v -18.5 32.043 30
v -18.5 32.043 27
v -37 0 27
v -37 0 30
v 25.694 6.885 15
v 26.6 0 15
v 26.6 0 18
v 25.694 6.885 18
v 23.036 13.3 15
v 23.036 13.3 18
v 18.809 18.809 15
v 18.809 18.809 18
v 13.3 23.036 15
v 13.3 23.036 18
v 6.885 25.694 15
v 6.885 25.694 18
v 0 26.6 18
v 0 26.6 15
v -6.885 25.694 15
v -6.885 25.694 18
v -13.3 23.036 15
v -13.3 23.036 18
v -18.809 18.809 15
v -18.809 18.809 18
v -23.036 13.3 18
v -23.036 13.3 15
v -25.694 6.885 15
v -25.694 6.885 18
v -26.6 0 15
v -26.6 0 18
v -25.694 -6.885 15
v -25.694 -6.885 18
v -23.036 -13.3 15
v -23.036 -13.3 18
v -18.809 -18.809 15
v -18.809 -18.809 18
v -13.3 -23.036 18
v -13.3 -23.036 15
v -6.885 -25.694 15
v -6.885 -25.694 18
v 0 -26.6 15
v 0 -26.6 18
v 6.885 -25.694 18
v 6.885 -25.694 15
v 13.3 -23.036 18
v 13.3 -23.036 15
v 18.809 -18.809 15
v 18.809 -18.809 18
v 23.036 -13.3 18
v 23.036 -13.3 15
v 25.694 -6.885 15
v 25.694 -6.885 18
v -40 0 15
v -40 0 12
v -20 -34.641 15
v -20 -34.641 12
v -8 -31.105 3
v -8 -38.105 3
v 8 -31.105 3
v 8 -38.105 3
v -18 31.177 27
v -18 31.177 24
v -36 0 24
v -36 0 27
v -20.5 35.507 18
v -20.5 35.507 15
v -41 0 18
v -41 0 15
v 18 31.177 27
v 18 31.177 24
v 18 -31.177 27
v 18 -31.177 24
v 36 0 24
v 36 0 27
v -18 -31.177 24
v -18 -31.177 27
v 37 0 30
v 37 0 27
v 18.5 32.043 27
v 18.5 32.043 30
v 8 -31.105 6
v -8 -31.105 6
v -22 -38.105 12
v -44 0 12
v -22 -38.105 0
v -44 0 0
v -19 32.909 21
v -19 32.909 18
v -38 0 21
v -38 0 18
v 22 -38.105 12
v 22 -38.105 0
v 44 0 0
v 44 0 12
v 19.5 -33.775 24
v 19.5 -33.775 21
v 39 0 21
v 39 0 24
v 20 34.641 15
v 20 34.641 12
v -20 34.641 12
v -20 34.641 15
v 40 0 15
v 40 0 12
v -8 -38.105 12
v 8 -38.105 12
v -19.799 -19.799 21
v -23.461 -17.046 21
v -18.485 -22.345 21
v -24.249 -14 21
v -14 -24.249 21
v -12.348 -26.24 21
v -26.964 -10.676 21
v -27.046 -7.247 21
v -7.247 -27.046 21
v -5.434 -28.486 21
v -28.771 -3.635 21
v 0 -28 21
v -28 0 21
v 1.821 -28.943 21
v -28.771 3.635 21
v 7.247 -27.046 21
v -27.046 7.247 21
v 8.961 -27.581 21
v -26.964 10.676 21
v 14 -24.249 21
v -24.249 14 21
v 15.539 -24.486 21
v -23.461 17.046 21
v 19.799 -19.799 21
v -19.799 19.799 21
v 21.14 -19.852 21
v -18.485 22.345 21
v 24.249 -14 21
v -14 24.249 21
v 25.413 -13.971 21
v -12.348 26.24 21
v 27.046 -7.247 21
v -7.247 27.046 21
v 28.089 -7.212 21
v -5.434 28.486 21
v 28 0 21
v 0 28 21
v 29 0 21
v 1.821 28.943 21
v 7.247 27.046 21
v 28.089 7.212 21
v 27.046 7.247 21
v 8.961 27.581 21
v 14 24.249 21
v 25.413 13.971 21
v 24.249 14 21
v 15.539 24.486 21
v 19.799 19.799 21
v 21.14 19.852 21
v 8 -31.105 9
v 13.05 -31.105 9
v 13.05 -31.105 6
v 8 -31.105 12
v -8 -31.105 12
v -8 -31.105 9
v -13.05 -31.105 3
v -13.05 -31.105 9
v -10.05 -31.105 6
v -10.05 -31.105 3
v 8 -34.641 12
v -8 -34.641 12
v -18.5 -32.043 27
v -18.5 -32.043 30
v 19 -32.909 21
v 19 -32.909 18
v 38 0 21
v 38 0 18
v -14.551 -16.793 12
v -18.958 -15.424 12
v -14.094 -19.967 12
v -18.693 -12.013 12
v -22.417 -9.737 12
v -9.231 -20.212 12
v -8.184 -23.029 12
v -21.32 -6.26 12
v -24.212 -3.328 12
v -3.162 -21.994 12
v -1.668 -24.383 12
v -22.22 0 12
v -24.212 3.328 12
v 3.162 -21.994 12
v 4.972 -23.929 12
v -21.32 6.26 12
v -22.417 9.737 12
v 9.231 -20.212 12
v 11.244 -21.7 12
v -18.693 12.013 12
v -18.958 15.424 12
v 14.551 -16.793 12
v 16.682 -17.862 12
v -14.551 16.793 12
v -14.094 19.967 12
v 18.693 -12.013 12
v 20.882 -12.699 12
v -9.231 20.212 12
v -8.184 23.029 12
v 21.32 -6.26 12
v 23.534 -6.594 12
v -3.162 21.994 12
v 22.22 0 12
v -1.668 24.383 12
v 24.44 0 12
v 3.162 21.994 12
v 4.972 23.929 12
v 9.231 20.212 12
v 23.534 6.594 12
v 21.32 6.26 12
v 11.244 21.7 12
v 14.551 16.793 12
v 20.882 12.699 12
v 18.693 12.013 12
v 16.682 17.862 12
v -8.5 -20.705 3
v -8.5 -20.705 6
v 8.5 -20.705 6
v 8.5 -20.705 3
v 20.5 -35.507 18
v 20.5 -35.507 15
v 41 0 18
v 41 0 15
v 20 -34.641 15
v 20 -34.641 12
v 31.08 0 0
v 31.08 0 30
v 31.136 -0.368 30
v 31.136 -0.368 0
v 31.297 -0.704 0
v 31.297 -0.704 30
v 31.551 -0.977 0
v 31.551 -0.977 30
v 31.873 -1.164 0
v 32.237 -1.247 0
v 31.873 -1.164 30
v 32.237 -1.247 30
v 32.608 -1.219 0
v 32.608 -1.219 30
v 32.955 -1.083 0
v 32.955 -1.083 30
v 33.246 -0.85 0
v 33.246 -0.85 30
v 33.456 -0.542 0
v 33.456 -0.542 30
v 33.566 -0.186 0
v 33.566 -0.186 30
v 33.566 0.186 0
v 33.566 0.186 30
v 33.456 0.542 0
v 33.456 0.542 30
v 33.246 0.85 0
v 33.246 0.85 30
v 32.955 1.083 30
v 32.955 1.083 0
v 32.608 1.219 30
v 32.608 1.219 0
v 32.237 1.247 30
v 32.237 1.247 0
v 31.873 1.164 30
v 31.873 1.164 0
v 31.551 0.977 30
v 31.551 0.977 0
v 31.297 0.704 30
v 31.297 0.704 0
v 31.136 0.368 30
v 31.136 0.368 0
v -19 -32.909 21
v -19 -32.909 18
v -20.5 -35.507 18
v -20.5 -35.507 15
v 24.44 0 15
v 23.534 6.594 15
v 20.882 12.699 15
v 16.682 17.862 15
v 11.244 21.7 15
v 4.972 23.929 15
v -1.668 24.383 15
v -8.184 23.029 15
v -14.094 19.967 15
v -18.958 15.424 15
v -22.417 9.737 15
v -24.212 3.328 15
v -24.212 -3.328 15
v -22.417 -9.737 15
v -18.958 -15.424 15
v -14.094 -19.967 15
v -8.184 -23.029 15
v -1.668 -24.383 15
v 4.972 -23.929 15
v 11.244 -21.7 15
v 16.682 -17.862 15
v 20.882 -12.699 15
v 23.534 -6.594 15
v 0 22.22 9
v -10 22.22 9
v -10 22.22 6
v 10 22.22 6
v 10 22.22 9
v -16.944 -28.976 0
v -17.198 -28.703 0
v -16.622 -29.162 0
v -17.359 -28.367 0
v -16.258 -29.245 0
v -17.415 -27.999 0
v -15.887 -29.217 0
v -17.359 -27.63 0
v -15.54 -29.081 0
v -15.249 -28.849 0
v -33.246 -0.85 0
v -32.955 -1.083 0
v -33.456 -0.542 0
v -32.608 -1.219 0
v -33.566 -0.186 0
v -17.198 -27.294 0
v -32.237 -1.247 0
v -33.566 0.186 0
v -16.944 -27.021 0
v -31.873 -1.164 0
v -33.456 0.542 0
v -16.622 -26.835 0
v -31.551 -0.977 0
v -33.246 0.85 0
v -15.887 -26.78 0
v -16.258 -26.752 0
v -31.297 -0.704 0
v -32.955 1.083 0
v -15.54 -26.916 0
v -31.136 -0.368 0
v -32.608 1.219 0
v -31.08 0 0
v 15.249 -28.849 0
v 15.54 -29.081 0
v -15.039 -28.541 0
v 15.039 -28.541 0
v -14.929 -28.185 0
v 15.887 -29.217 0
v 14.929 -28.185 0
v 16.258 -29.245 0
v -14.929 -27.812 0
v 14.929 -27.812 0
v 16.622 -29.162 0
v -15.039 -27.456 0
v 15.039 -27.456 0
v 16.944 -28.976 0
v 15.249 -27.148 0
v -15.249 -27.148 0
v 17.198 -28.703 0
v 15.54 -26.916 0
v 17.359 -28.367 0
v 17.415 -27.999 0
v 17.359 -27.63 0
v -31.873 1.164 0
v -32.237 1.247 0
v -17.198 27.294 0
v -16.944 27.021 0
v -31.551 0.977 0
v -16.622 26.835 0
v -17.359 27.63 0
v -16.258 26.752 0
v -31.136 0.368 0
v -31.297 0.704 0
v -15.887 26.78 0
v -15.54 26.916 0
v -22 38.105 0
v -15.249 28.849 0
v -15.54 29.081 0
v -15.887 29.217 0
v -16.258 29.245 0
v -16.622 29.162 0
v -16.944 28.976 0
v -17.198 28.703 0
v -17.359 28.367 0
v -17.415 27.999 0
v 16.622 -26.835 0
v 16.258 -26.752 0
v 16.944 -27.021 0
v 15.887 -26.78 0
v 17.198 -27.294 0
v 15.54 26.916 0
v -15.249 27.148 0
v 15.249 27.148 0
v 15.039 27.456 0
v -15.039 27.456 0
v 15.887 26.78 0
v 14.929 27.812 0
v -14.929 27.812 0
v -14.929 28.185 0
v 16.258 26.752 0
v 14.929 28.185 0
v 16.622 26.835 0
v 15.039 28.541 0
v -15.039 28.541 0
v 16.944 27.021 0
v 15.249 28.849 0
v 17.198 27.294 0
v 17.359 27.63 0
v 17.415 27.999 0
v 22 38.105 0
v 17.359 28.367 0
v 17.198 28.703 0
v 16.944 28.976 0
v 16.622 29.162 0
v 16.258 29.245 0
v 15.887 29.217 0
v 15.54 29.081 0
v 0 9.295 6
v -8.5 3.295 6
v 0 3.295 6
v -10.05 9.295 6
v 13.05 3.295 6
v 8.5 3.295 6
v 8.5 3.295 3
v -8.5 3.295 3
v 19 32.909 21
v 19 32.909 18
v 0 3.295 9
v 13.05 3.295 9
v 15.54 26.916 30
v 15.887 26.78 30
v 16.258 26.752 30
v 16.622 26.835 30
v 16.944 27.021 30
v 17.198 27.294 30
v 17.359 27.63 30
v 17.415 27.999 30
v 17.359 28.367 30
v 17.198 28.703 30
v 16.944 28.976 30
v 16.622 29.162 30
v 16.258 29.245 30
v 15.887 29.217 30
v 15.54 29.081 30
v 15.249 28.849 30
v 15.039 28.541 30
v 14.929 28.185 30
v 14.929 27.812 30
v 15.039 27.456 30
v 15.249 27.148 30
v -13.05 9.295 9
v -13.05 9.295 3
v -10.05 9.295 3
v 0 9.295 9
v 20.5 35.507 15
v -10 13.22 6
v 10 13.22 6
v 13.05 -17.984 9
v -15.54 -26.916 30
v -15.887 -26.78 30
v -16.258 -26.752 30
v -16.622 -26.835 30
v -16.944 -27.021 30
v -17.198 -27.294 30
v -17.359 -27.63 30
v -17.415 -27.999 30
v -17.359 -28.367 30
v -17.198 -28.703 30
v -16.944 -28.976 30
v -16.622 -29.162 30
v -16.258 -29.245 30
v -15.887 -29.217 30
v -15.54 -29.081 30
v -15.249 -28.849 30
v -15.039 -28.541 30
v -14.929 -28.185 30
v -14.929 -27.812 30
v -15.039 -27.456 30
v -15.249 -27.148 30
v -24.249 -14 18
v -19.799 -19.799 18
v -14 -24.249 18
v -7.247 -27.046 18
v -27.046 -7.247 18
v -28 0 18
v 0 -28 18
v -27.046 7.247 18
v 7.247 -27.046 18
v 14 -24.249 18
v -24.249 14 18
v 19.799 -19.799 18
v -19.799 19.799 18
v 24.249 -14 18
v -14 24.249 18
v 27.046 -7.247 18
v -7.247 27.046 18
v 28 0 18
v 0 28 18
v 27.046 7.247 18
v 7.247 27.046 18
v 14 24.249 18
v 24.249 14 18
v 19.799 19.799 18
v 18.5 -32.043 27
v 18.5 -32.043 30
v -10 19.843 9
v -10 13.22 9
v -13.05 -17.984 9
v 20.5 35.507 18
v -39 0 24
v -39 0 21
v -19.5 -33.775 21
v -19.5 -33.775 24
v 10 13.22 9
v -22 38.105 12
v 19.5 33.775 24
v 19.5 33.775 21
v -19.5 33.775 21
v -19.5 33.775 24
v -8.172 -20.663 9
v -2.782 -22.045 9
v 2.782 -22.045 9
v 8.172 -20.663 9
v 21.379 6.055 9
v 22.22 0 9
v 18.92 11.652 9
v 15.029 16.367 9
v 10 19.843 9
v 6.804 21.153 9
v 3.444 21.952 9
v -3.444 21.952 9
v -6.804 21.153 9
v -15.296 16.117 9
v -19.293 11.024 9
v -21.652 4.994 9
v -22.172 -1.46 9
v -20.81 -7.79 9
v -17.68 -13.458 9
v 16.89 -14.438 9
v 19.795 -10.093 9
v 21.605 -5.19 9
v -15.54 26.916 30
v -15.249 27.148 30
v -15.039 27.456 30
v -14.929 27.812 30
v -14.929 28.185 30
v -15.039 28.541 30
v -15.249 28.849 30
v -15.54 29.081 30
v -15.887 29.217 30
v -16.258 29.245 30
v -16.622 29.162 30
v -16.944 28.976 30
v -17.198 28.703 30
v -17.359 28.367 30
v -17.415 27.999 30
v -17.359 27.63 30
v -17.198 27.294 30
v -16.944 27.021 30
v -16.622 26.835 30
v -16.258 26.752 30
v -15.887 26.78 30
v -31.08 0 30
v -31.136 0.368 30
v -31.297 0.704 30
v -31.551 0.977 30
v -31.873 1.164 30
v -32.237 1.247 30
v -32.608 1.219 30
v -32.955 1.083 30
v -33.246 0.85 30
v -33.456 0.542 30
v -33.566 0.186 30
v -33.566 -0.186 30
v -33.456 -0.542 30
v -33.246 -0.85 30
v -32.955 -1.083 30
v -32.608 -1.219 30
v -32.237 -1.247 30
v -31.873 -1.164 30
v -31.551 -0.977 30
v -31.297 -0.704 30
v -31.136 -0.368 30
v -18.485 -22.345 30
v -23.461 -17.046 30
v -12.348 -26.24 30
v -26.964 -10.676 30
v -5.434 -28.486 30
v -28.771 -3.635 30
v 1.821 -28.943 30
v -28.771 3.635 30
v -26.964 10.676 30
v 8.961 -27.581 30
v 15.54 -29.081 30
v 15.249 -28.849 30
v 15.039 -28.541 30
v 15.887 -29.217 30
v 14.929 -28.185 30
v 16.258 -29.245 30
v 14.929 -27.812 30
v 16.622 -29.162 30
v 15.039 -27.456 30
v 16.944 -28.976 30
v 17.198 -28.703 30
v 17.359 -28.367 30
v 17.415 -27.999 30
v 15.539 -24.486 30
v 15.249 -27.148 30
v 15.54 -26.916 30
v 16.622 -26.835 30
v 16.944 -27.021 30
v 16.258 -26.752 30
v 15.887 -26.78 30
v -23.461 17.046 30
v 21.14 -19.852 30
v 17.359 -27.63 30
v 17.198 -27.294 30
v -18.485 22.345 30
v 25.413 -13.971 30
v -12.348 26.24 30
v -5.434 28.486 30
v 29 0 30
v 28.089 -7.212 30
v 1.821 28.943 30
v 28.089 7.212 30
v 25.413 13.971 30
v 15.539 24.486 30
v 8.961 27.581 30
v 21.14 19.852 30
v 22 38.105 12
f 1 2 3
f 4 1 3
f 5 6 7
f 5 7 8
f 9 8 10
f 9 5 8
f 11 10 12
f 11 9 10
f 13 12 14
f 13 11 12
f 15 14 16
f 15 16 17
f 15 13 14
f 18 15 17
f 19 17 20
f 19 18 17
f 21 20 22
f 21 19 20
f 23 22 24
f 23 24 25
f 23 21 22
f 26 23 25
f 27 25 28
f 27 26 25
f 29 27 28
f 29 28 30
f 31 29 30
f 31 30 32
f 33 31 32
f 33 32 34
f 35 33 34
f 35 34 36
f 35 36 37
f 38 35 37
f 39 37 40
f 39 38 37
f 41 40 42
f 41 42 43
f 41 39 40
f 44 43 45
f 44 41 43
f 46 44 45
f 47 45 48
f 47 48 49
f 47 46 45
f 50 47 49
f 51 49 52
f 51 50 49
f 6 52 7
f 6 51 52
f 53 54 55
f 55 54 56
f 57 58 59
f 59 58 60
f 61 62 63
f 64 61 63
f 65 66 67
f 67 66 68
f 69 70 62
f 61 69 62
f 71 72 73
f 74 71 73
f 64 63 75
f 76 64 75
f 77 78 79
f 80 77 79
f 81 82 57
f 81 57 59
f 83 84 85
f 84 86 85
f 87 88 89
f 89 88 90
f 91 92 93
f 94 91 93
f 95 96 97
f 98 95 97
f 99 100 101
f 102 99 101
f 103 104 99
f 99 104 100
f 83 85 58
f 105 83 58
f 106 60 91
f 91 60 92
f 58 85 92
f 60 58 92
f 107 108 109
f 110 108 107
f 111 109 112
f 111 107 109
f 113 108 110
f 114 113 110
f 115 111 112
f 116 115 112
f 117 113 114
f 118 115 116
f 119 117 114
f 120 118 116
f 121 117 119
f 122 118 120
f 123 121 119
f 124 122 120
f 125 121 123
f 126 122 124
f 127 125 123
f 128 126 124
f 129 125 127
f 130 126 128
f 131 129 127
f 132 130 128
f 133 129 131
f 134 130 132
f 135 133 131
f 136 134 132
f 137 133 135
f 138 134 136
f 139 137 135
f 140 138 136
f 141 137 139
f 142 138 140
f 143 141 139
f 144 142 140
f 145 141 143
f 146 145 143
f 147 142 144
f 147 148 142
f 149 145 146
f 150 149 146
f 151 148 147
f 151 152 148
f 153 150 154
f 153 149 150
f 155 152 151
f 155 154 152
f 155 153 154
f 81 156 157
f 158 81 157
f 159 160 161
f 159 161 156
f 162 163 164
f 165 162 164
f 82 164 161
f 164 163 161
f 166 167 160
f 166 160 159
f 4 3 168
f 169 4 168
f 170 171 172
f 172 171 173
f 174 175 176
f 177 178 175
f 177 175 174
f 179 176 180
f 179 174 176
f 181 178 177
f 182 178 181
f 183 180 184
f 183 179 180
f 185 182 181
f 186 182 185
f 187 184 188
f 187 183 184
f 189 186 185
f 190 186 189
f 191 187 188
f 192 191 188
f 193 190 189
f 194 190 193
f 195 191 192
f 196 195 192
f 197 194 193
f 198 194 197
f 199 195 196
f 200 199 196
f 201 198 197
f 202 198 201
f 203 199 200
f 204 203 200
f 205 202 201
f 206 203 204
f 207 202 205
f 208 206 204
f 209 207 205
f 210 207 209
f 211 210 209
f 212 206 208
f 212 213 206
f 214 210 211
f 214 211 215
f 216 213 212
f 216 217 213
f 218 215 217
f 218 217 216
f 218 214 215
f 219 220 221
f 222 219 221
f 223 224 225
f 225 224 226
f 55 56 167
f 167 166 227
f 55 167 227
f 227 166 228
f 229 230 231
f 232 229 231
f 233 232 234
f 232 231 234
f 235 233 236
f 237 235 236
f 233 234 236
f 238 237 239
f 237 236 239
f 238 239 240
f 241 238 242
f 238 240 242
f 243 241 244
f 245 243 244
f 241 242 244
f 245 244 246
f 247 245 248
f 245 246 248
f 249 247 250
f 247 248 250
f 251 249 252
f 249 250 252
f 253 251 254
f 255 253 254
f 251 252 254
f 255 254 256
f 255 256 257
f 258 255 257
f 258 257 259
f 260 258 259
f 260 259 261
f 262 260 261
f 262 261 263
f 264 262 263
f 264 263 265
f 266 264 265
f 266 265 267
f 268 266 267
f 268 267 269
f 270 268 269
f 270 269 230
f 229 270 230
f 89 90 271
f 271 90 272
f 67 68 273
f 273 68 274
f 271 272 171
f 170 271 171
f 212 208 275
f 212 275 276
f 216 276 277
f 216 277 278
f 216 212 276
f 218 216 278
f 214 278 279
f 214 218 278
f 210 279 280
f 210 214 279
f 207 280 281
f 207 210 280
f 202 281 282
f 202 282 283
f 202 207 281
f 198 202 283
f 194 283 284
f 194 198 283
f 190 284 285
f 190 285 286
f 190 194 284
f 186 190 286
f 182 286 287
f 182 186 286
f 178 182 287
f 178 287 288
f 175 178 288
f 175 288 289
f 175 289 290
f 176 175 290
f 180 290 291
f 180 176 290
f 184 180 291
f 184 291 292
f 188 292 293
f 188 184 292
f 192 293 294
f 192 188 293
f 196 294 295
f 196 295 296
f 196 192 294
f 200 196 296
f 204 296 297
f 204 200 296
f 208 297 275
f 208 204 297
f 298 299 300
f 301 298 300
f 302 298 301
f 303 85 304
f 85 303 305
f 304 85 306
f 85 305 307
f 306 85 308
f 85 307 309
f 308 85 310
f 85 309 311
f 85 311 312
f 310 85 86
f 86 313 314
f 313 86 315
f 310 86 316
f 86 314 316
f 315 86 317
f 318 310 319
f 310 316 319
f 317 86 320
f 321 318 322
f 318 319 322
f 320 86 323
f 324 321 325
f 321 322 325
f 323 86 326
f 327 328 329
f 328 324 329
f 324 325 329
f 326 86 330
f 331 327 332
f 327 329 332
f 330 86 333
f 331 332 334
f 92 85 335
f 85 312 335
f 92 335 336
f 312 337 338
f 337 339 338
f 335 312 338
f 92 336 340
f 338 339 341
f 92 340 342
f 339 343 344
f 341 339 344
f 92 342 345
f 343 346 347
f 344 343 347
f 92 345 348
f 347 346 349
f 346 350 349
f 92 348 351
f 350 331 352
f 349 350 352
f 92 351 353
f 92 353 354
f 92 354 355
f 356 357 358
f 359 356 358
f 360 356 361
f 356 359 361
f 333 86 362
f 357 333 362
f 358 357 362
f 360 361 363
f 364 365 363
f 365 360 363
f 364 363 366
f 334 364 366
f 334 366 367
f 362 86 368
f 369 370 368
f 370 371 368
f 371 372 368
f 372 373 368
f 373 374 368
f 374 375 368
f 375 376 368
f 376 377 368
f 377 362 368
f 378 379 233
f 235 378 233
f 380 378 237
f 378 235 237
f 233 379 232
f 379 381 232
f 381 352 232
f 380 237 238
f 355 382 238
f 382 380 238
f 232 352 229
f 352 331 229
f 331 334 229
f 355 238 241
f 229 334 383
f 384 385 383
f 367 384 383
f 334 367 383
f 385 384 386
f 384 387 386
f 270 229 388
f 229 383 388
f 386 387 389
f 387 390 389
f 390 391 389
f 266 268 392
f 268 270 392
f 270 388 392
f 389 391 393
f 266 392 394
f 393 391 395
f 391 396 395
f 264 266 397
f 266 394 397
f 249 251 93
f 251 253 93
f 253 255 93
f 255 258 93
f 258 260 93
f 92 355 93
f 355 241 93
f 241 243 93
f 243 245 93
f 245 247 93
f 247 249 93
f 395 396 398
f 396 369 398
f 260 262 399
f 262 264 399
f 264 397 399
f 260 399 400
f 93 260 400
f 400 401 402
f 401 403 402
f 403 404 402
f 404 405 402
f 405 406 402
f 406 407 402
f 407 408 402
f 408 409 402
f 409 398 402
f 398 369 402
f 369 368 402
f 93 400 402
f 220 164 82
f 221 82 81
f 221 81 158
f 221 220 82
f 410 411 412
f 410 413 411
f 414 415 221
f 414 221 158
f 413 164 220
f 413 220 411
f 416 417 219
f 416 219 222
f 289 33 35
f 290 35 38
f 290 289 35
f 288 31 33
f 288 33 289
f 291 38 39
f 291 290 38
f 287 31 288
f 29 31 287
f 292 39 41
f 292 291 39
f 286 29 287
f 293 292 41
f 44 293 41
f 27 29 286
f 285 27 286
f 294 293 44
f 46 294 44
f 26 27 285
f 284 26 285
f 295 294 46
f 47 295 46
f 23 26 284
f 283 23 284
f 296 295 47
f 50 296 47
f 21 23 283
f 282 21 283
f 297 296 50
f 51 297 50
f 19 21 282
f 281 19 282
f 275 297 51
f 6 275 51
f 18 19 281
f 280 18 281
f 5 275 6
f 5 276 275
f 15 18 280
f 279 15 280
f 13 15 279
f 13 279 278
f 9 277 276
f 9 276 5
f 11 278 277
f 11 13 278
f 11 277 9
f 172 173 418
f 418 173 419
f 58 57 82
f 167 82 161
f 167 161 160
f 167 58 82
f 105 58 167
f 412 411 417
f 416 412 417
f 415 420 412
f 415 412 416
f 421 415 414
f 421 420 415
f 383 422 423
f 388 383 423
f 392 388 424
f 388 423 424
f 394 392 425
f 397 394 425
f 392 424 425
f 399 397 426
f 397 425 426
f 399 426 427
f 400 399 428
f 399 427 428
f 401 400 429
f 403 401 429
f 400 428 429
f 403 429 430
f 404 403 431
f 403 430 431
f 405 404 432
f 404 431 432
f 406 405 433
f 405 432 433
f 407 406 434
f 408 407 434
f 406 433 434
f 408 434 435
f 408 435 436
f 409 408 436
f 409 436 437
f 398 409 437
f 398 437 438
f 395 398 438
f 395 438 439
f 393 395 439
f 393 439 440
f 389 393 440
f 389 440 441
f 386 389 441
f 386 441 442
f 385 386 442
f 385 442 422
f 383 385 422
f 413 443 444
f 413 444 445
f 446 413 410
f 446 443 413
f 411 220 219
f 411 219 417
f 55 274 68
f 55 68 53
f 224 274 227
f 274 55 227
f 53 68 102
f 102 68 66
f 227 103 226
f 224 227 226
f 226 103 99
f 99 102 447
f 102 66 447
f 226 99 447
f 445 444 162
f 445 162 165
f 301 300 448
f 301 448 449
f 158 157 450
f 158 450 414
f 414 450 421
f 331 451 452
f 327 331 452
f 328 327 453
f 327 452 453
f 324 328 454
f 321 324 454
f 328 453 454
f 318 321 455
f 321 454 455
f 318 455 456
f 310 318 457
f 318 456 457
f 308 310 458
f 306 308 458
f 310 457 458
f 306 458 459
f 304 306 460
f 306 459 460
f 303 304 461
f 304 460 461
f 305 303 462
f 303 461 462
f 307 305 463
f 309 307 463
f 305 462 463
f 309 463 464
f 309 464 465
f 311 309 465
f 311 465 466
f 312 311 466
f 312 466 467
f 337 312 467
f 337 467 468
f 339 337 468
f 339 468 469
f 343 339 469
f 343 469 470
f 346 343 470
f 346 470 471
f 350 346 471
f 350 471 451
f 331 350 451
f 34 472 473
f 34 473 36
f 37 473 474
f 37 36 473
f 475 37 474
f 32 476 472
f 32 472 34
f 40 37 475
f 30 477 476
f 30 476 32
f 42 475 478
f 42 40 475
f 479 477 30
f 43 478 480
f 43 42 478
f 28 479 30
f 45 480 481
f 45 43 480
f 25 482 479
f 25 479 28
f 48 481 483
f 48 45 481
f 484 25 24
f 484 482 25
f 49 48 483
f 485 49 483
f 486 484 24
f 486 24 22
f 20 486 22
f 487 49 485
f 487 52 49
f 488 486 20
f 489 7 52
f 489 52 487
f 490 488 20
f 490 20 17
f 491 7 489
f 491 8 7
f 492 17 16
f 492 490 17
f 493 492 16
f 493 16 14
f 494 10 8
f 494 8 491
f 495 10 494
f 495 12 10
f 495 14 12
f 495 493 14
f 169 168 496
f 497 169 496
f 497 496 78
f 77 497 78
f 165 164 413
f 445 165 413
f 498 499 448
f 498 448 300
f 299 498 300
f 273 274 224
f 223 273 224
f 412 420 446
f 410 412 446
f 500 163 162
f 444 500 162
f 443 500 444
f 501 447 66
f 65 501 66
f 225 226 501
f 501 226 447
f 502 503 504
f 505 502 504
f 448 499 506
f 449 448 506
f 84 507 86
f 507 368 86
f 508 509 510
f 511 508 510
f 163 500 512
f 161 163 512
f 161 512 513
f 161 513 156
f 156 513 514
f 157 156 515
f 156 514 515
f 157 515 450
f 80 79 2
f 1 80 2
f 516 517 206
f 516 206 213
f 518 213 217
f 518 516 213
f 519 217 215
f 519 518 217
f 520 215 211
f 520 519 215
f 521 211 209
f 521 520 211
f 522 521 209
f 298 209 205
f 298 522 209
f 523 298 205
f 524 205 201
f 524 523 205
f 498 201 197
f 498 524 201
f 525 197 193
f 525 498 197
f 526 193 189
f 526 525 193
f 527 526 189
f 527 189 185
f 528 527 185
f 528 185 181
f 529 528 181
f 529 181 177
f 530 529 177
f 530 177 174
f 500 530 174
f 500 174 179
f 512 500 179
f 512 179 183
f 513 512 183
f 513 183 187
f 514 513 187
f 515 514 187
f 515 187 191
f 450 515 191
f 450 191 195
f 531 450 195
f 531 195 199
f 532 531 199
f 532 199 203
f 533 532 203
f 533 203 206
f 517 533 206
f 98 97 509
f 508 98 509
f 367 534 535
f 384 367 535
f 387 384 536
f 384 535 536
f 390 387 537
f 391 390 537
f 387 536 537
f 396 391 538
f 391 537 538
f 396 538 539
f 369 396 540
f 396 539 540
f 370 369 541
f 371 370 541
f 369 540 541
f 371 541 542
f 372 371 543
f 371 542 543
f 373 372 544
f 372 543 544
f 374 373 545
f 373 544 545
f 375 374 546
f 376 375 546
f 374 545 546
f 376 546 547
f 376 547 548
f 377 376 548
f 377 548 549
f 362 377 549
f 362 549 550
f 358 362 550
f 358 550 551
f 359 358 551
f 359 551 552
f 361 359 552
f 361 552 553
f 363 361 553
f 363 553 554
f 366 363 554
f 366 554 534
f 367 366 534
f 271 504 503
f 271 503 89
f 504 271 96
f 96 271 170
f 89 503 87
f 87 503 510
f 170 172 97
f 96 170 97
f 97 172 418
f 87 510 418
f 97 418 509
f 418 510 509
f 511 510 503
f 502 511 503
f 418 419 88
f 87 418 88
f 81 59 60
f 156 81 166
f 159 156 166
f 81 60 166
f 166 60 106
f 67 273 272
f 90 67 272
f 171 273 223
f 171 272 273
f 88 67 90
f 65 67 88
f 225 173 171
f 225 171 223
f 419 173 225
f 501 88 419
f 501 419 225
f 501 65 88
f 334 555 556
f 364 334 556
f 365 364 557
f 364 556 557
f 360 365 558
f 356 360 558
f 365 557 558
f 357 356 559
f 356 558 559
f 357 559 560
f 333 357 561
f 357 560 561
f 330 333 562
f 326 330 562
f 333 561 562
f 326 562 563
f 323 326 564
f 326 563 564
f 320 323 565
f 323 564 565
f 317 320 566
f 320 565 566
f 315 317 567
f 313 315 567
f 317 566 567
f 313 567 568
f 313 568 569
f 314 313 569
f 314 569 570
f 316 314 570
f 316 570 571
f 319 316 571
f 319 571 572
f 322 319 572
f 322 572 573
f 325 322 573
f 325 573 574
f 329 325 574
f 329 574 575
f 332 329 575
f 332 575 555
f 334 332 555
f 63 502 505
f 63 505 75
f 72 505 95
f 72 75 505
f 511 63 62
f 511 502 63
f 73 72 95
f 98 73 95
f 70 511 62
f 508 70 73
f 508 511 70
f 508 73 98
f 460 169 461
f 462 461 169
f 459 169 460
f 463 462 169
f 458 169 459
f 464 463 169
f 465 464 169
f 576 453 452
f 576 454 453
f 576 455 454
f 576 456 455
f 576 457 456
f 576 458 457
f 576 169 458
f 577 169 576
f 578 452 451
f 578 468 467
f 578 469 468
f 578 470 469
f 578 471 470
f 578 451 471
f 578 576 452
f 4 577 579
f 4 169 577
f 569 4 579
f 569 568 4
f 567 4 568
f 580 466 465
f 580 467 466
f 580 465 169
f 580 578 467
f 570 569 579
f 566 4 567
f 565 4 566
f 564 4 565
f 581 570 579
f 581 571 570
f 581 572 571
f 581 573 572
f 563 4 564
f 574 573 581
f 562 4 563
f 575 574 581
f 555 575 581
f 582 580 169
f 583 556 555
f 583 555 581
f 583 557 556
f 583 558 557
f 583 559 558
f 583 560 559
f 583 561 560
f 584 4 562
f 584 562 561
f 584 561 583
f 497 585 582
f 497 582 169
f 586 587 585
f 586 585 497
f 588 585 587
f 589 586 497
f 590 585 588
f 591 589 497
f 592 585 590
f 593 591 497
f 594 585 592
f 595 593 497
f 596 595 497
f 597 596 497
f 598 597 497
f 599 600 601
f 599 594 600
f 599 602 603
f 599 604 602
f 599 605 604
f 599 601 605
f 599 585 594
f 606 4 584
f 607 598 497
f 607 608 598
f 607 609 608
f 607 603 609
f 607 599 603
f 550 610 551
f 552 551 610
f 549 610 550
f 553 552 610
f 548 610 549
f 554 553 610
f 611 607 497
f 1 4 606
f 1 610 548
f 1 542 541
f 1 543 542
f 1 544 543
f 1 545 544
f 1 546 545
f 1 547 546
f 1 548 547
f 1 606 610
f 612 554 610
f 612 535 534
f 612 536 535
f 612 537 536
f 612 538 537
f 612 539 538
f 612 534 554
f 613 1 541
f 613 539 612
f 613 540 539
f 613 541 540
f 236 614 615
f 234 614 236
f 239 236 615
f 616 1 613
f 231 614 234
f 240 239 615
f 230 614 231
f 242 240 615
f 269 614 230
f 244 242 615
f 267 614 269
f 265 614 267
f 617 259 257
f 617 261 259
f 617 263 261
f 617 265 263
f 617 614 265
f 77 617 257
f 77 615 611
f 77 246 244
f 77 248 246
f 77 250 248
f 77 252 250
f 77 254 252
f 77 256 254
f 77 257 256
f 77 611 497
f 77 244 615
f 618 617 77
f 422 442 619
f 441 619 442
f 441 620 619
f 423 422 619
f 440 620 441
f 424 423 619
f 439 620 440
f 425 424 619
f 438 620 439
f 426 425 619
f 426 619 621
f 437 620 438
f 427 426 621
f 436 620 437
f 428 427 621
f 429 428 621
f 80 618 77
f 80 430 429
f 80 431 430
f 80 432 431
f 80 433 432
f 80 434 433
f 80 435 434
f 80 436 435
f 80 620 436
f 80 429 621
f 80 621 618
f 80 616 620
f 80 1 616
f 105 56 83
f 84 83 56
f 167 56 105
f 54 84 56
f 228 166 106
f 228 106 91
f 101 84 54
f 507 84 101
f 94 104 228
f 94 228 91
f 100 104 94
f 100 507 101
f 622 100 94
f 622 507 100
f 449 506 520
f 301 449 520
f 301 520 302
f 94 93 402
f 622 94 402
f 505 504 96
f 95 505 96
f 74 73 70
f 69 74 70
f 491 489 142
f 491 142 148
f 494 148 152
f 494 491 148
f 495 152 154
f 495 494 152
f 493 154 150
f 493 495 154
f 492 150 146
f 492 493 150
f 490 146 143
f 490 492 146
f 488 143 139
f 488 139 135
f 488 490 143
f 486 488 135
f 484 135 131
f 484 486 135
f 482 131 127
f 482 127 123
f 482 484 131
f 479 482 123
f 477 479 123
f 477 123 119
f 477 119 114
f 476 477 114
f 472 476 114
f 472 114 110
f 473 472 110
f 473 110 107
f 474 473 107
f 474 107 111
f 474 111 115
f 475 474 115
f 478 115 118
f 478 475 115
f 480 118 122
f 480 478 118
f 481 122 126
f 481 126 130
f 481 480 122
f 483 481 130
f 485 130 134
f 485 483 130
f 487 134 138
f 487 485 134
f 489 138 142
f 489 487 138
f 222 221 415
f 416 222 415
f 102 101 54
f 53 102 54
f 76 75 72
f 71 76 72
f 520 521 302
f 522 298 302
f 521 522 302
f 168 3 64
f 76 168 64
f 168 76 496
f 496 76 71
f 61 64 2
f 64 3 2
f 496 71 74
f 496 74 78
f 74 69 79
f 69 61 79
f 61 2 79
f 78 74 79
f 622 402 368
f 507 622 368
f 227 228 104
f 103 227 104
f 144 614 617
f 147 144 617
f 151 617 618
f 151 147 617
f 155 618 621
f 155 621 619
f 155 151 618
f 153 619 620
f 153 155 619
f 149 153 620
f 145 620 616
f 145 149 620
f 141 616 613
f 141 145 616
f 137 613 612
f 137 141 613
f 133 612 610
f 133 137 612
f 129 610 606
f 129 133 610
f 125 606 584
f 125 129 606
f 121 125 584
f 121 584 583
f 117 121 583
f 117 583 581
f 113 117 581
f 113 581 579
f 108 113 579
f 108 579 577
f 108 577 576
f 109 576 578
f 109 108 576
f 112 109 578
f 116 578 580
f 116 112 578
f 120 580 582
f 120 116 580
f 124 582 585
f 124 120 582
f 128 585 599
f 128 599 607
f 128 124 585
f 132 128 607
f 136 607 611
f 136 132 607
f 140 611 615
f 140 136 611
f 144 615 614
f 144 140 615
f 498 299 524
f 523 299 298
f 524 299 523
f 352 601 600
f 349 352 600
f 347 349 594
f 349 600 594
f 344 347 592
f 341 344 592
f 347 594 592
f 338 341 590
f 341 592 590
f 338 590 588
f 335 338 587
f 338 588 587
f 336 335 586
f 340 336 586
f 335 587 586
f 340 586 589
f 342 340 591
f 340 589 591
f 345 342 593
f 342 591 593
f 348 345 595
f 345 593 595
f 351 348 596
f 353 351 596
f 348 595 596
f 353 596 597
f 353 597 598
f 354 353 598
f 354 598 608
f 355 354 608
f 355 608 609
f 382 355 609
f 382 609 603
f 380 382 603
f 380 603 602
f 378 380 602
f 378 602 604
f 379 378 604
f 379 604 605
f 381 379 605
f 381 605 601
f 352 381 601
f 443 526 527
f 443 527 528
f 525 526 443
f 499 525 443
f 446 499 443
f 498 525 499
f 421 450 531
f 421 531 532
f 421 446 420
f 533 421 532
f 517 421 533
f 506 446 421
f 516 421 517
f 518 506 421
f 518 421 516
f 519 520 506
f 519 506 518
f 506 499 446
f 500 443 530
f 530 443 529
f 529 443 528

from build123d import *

# Parameters (mm, degrees)
PAD_DEPTH          = 9
SKETCH001_W        = 26.1
SKETCH001_H        = 34.4
POCKET_DEPTH       = 3
SKETCH002_R        = 22.22
PAD001_DEPTH       = 3
SKETCH003_R        = 24.44
PAD002_DEPTH       = 3
SKETCH004_R        = 26.6
PAD003_DEPTH       = 3
SKETCH005_R        = 28
PAD004_DEPTH       = 3
SKETCH006_R        = 29
PAD005_DEPTH       = 3
SKETCH007_R        = 29
PAD006_DEPTH       = 3
SKETCH008_R        = 29
PAD007_DEPTH       = 3
SKETCH009_W        = 17
SKETCH009_H        = 24
POCKET001_DEPTH    = 3
SKETCH010_W        = 16
SKETCH010_H        = 9
POCKET002_DEPTH    = 7
SKETCH011_W        = 20
SKETCH011_H        = 9
POCKET003_DEPTH    = 3
SKETCH012_R        = 1.25
POCKET004_DEPTH    = 270.433943
POLARPATTERN_COUNT = 6
SKETCH013_W        = 3
SKETCH013_H        = 38
POCKET005_DEPTH    = 3
SKETCH014_W        = 3
SKETCH014_H        = 6
POCKET006_DEPTH    = 6
SKETCH015_W        = 10.05
SKETCH015_H        = 6
POCKET007_DEPTH    = 3


with BuildPart() as part:
    # Sketch → Pad (new body)
    with BuildSketch(Plane.XY):
        Polygon((44, 0), (22, 38.105118), (-22, 38.105118), (-44, 0), (-22, -38.105118), (22, -38.105118), align=None)
    extrude(amount=PAD_DEPTH)

    # Sketch001 (on Face8 of Pad) → Pocket (cut)
    with BuildSketch(Plane.XY.offset(9)):
        with Locations((0, -13.905118)):
            Rectangle(SKETCH001_W, SKETCH001_H)
    extrude(amount=-POCKET_DEPTH, mode=Mode.SUBTRACT)

    # Sketch002 (on Face5 of Pocket) → Pad001 (join)
    with BuildSketch(Plane.XY.offset(9)):
        Polygon((22, 38.105118), (-22, 38.105118), (-44, 0), (-22, -38.105118), (22, -38.105118), (44, 0), align=None)
        Circle(SKETCH002_R, mode=Mode.SUBTRACT)
    extrude(amount=PAD001_DEPTH)

    # Sketch003 (on Face14 of Pad001) → Pad002 (join)
    with BuildSketch(Plane.XY.offset(12)):
        Polygon((40, 0), (20, 34.641016), (-20, 34.641016), (-40, 0), (-20, -34.641016), (20, -34.641016), align=None)
        Circle(SKETCH003_R, mode=Mode.SUBTRACT)
    extrude(amount=PAD002_DEPTH)

    # Sketch004 (on Face21 of Pad002) → Pad003 (join)
    with BuildSketch(Plane.XY.offset(15)):
        Polygon((41, 0), (20.5, 35.507042), (-20.5, 35.507042), (-41, 0), (-20.5, -35.507042), (20.5, -35.507042), align=None)
        Circle(SKETCH004_R, mode=Mode.SUBTRACT)
    extrude(amount=PAD003_DEPTH)

    # Sketch005 (on Face28 of Pad003) → Pad004 (join)
    with BuildSketch(Plane.XY.offset(18)):
        Polygon((19, 32.908965), (-19, 32.908965), (-38, 0), (-19, -32.908965), (19, -32.908965), (38, 0), align=None)
        Circle(SKETCH005_R, mode=Mode.SUBTRACT)
    extrude(amount=PAD004_DEPTH)

    # Sketch006 (on Face35 of Pad004) → Pad005 (join)
    with BuildSketch(Plane.XY.offset(21)):
        Polygon((39, 0), (19.5, 33.774991), (-19.5, 33.774991), (-39, 0), (-19.5, -33.774991), (19.5, -33.774991), align=None)
        Circle(SKETCH006_R, mode=Mode.SUBTRACT)
    extrude(amount=PAD005_DEPTH)

    # Sketch007 (on Face42 of Pad005) → Pad006 (join)
    with BuildSketch(Plane.XY.offset(24)):
        Polygon((36, 0), (18, 31.176915), (-18, 31.176915), (-36, 0), (-18, -31.176915), (18, -31.176915), align=None)
        Circle(SKETCH007_R, mode=Mode.SUBTRACT)
    extrude(amount=PAD006_DEPTH)

    # Sketch008 (on Face49 of Pad006) → Pad007 (join)
    with BuildSketch(Plane.XY.offset(27)):
        Polygon((37, 0), (18.5, 32.04294), (-18.5, 32.04294), (-37, 0), (-18.5, -32.04294), (18.5, -32.04294), align=None)
        Circle(SKETCH008_R, mode=Mode.SUBTRACT)
    extrude(amount=PAD007_DEPTH)

    # Sketch009 (on Face74 of Pad007) → Pocket001 (cut)
    with BuildSketch(Plane.XY.offset(6)):
        with Locations((0, -8.705118)):
            Rectangle(SKETCH009_W, SKETCH009_H)
    extrude(amount=-POCKET001_DEPTH, mode=Mode.SUBTRACT)

    # Sketch010 (on Face12 of Pocket001) → Pocket002 (cut)
    with BuildSketch(Plane.XZ.offset(38.105118)):
        with Locations((0, 7.5)):
            Rectangle(SKETCH010_W, SKETCH010_H)
    extrude(amount=-POCKET002_DEPTH, mode=Mode.SUBTRACT)

    # Sketch011 (on Face40 of Pocket002) → Pocket003 (cut)
    with BuildSketch(Plane.XY.offset(9)):
        with Locations((0, 17.72)):
            Rectangle(SKETCH011_W, SKETCH011_H)
    extrude(amount=-POCKET003_DEPTH, mode=Mode.SUBTRACT)

    # Sketch012 (on Face93 of Pocket003) → Pocket004 (cut, through all)
    with BuildSketch(Plane.XY.offset(30)):
        with Locations((-32.33, 0)):
            Circle(SKETCH012_R)
    pocket004 = extrude(amount=-POCKET004_DEPTH, mode=Mode.SUBTRACT)

    # PolarPattern: Pocket004 ×6 about axis
    polarpattern_axis = Axis((0, 0, 30), (0, 0, 1))
    for i in range(1, POLARPATTERN_COUNT):
        add(pocket004.rotate(polarpattern_axis, i * 360 / POLARPATTERN_COUNT), mode=Mode.SUBTRACT)

    # Sketch013 (on Face45 of PolarPattern) → Pocket005 (cut)
    with BuildSketch(Plane.XY.offset(6)):
        with Locations((-11.55, -12.105118)):
            Rectangle(SKETCH013_W, SKETCH013_H)
    extrude(amount=-POCKET005_DEPTH, mode=Mode.SUBTRACT)

    # Sketch014 (on Face58 of Pocket005) → Pocket006 (cut)
    with BuildSketch(Plane.XY.offset(9)):
        with Locations((-11.55, 6.294882)):
            Rectangle(SKETCH014_W, SKETCH014_H)
    extrude(amount=-POCKET006_DEPTH, mode=Mode.SUBTRACT)

    # Sketch015 (on Face58 of Pocket006) → Pocket007 (cut)
    with BuildSketch(Plane.XY.offset(9)):
        with Locations((-5.025, 6.294882)):
            Rectangle(SKETCH015_W, SKETCH015_H)
    extrude(amount=-POCKET007_DEPTH, mode=Mode.SUBTRACT)


solid = part.part
